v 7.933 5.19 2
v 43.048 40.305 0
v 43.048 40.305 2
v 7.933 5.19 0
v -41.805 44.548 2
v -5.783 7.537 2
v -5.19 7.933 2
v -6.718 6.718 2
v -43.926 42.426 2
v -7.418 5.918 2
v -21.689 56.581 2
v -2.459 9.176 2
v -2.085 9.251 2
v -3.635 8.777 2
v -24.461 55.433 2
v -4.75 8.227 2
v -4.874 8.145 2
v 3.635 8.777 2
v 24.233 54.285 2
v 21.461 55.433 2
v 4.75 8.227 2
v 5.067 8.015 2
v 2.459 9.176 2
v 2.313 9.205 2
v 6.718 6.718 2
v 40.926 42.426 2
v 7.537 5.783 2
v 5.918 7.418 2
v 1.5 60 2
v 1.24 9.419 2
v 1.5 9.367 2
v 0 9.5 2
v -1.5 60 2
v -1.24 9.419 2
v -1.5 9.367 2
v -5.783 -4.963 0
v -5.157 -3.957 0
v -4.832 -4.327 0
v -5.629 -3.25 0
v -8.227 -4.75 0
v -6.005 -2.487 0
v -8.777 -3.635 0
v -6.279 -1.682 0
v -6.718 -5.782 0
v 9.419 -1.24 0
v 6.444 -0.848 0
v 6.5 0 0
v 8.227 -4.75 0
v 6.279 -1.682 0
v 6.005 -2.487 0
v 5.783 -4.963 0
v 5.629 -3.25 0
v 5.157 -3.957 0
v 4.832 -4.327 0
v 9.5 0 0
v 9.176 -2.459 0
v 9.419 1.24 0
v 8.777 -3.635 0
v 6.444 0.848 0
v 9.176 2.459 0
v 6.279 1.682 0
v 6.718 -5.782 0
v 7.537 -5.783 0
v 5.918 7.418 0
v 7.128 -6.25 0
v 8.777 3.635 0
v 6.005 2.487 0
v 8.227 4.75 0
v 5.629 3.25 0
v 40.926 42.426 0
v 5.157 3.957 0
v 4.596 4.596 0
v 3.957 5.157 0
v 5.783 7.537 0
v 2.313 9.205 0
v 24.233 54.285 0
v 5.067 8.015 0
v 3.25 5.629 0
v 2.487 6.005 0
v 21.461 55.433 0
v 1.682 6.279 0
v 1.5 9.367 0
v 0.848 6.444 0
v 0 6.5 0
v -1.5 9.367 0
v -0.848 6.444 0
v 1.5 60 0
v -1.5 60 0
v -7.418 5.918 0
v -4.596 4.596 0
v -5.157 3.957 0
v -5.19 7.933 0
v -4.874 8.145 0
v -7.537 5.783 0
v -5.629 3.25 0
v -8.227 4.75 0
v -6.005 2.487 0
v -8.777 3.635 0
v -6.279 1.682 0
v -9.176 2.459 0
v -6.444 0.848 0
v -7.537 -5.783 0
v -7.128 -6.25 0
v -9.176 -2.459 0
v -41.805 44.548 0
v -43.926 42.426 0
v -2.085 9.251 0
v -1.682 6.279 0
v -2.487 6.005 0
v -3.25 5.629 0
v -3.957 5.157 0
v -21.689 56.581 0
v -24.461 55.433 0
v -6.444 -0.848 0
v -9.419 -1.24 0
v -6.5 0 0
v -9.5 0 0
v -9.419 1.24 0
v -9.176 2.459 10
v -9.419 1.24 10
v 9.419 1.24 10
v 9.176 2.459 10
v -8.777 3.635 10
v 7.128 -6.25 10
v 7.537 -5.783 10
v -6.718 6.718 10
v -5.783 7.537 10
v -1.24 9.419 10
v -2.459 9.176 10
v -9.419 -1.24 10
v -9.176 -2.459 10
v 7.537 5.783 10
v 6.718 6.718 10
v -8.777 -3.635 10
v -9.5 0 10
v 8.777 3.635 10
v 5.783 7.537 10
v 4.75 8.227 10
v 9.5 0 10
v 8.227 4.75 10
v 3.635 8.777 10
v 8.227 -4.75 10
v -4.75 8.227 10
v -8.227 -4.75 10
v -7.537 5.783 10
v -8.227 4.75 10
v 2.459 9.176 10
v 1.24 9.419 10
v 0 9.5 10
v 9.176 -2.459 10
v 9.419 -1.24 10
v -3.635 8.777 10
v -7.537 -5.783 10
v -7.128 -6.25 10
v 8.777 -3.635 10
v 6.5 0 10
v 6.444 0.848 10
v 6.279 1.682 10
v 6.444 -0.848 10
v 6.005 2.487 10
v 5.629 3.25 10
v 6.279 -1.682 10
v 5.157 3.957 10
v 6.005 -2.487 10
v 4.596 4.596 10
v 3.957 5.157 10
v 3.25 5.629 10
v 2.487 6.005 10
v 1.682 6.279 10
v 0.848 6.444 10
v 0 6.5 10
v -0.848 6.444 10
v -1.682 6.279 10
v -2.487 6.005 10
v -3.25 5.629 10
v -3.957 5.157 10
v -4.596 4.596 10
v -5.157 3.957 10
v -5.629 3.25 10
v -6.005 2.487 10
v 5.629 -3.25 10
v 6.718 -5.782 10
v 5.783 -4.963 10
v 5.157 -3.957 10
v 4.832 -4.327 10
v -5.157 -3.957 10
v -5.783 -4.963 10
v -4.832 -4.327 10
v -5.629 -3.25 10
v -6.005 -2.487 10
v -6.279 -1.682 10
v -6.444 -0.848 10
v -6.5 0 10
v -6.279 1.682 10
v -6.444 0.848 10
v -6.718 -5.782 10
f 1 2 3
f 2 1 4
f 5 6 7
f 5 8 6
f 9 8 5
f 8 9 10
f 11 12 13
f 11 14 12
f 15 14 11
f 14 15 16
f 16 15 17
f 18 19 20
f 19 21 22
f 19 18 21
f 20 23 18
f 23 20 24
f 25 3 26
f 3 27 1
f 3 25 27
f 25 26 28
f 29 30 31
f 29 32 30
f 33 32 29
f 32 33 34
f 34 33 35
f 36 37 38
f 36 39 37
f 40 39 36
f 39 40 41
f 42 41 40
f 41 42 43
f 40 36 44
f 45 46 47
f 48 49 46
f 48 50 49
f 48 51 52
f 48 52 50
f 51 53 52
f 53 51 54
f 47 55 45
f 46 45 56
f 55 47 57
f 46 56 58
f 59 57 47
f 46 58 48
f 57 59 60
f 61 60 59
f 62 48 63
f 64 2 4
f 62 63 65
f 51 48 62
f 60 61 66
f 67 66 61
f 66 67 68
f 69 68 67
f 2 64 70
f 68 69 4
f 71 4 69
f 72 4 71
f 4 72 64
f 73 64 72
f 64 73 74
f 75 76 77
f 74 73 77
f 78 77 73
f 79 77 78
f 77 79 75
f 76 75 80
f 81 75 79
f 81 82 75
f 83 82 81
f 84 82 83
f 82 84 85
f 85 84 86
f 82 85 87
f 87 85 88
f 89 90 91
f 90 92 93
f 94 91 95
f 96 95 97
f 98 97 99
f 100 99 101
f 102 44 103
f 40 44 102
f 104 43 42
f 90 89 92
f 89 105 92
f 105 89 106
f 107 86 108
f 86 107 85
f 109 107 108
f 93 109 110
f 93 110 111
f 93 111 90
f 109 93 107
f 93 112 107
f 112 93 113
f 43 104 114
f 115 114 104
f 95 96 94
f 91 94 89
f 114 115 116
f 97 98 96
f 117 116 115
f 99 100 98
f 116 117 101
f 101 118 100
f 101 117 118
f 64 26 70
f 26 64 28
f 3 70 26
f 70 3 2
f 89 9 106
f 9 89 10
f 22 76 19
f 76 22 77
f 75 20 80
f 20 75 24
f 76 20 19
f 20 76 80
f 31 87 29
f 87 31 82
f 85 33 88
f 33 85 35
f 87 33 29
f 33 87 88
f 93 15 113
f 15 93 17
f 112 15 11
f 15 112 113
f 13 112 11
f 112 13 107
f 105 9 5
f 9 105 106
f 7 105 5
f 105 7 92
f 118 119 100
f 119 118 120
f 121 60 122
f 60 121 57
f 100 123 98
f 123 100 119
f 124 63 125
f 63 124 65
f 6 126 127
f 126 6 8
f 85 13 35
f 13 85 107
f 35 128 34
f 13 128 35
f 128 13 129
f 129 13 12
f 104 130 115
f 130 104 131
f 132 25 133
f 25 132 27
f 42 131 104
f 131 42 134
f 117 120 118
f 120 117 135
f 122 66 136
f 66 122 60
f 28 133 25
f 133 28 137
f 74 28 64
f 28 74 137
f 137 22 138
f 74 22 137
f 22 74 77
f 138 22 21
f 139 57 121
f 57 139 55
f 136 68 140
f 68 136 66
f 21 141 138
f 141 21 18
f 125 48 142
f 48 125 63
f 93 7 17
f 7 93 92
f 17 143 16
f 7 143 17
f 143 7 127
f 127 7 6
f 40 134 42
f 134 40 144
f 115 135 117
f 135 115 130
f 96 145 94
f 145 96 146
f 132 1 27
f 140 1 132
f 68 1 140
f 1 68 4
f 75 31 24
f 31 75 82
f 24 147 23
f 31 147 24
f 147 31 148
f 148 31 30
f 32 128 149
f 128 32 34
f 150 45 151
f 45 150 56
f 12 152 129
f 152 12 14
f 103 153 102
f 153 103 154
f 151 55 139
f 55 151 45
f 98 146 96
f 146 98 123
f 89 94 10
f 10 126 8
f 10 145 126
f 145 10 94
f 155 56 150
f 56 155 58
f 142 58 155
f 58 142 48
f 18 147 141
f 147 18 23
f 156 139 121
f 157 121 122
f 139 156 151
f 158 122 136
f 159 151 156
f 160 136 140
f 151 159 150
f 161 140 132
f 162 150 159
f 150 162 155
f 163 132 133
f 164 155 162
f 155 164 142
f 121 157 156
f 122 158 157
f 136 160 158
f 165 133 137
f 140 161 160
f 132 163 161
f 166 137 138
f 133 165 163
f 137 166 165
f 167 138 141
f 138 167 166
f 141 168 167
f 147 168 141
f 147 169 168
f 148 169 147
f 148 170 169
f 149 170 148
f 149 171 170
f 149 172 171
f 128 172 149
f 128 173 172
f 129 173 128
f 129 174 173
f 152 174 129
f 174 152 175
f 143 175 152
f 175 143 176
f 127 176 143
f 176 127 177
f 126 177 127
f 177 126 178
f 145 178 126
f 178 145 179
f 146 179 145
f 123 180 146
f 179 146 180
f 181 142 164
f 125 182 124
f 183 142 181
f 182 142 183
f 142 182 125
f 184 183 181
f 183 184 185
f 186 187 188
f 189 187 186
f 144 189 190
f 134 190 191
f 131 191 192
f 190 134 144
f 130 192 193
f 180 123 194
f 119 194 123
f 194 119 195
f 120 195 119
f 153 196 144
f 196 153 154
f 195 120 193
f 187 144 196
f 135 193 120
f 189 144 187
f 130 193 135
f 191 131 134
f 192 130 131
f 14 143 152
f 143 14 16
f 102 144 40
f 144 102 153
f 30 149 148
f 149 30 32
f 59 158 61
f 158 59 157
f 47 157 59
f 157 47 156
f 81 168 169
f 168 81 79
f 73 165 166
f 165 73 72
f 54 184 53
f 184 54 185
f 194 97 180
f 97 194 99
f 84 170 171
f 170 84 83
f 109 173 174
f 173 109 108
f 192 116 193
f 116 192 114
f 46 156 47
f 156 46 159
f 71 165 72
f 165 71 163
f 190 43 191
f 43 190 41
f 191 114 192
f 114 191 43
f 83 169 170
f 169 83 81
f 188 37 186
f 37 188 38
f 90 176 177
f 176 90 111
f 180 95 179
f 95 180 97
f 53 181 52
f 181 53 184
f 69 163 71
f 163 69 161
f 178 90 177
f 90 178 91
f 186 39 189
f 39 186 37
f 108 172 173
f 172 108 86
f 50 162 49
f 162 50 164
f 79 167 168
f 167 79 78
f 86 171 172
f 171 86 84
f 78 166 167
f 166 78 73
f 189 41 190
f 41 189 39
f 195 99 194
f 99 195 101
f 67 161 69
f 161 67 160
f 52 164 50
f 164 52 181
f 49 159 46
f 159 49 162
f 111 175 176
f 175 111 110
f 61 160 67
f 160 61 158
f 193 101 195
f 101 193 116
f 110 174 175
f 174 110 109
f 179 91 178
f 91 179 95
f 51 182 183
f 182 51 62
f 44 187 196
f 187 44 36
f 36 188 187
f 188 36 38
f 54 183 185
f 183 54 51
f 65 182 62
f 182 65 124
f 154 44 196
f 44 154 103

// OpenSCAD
spike_l = 60; // spike length
spike_h = 2;  // spike height
spike_w = 3;  // spike width

pole_dia = 13;  // diameter of the pole
pole_thick = 3; // thickness of the clip
pole_h = 10;    // height of the clip

$fn = 48;

pole_r = pole_dia/2;

difference (){

  union(){
    translate([0-(spike_w/2), 0, 0]){

      rotate(a=-45, v=[0,0,1])
        cube([spike_w, spike_l, spike_h], center=false);

      rotate(a=-22.5, v=[0,0,1])
        cube([spike_w, spike_l, spike_h], center=false);

      cube([spike_w, spike_l, spike_h], center=false);

      rotate(a=22.5, v=[0,0,1])
        cube([spike_w, spike_l, spike_h], center=false);

      rotate(a=45, v=[0,0,1])
        cube([spike_w, spike_l, spike_h], center=false);
    }

    cylinder(r=pole_r+pole_thick, h=pole_h);
  }

  translate([0, 0, 0-(pole_h*0.1) ]){
    cylinder(r=pole_r, h=pole_h*1.2);

    translate([0, 0-pole_r-(pole_thick*2), 0])
      cylinder(r=pole_r+pole_thick, h=pole_h*1.2);
  }
}
